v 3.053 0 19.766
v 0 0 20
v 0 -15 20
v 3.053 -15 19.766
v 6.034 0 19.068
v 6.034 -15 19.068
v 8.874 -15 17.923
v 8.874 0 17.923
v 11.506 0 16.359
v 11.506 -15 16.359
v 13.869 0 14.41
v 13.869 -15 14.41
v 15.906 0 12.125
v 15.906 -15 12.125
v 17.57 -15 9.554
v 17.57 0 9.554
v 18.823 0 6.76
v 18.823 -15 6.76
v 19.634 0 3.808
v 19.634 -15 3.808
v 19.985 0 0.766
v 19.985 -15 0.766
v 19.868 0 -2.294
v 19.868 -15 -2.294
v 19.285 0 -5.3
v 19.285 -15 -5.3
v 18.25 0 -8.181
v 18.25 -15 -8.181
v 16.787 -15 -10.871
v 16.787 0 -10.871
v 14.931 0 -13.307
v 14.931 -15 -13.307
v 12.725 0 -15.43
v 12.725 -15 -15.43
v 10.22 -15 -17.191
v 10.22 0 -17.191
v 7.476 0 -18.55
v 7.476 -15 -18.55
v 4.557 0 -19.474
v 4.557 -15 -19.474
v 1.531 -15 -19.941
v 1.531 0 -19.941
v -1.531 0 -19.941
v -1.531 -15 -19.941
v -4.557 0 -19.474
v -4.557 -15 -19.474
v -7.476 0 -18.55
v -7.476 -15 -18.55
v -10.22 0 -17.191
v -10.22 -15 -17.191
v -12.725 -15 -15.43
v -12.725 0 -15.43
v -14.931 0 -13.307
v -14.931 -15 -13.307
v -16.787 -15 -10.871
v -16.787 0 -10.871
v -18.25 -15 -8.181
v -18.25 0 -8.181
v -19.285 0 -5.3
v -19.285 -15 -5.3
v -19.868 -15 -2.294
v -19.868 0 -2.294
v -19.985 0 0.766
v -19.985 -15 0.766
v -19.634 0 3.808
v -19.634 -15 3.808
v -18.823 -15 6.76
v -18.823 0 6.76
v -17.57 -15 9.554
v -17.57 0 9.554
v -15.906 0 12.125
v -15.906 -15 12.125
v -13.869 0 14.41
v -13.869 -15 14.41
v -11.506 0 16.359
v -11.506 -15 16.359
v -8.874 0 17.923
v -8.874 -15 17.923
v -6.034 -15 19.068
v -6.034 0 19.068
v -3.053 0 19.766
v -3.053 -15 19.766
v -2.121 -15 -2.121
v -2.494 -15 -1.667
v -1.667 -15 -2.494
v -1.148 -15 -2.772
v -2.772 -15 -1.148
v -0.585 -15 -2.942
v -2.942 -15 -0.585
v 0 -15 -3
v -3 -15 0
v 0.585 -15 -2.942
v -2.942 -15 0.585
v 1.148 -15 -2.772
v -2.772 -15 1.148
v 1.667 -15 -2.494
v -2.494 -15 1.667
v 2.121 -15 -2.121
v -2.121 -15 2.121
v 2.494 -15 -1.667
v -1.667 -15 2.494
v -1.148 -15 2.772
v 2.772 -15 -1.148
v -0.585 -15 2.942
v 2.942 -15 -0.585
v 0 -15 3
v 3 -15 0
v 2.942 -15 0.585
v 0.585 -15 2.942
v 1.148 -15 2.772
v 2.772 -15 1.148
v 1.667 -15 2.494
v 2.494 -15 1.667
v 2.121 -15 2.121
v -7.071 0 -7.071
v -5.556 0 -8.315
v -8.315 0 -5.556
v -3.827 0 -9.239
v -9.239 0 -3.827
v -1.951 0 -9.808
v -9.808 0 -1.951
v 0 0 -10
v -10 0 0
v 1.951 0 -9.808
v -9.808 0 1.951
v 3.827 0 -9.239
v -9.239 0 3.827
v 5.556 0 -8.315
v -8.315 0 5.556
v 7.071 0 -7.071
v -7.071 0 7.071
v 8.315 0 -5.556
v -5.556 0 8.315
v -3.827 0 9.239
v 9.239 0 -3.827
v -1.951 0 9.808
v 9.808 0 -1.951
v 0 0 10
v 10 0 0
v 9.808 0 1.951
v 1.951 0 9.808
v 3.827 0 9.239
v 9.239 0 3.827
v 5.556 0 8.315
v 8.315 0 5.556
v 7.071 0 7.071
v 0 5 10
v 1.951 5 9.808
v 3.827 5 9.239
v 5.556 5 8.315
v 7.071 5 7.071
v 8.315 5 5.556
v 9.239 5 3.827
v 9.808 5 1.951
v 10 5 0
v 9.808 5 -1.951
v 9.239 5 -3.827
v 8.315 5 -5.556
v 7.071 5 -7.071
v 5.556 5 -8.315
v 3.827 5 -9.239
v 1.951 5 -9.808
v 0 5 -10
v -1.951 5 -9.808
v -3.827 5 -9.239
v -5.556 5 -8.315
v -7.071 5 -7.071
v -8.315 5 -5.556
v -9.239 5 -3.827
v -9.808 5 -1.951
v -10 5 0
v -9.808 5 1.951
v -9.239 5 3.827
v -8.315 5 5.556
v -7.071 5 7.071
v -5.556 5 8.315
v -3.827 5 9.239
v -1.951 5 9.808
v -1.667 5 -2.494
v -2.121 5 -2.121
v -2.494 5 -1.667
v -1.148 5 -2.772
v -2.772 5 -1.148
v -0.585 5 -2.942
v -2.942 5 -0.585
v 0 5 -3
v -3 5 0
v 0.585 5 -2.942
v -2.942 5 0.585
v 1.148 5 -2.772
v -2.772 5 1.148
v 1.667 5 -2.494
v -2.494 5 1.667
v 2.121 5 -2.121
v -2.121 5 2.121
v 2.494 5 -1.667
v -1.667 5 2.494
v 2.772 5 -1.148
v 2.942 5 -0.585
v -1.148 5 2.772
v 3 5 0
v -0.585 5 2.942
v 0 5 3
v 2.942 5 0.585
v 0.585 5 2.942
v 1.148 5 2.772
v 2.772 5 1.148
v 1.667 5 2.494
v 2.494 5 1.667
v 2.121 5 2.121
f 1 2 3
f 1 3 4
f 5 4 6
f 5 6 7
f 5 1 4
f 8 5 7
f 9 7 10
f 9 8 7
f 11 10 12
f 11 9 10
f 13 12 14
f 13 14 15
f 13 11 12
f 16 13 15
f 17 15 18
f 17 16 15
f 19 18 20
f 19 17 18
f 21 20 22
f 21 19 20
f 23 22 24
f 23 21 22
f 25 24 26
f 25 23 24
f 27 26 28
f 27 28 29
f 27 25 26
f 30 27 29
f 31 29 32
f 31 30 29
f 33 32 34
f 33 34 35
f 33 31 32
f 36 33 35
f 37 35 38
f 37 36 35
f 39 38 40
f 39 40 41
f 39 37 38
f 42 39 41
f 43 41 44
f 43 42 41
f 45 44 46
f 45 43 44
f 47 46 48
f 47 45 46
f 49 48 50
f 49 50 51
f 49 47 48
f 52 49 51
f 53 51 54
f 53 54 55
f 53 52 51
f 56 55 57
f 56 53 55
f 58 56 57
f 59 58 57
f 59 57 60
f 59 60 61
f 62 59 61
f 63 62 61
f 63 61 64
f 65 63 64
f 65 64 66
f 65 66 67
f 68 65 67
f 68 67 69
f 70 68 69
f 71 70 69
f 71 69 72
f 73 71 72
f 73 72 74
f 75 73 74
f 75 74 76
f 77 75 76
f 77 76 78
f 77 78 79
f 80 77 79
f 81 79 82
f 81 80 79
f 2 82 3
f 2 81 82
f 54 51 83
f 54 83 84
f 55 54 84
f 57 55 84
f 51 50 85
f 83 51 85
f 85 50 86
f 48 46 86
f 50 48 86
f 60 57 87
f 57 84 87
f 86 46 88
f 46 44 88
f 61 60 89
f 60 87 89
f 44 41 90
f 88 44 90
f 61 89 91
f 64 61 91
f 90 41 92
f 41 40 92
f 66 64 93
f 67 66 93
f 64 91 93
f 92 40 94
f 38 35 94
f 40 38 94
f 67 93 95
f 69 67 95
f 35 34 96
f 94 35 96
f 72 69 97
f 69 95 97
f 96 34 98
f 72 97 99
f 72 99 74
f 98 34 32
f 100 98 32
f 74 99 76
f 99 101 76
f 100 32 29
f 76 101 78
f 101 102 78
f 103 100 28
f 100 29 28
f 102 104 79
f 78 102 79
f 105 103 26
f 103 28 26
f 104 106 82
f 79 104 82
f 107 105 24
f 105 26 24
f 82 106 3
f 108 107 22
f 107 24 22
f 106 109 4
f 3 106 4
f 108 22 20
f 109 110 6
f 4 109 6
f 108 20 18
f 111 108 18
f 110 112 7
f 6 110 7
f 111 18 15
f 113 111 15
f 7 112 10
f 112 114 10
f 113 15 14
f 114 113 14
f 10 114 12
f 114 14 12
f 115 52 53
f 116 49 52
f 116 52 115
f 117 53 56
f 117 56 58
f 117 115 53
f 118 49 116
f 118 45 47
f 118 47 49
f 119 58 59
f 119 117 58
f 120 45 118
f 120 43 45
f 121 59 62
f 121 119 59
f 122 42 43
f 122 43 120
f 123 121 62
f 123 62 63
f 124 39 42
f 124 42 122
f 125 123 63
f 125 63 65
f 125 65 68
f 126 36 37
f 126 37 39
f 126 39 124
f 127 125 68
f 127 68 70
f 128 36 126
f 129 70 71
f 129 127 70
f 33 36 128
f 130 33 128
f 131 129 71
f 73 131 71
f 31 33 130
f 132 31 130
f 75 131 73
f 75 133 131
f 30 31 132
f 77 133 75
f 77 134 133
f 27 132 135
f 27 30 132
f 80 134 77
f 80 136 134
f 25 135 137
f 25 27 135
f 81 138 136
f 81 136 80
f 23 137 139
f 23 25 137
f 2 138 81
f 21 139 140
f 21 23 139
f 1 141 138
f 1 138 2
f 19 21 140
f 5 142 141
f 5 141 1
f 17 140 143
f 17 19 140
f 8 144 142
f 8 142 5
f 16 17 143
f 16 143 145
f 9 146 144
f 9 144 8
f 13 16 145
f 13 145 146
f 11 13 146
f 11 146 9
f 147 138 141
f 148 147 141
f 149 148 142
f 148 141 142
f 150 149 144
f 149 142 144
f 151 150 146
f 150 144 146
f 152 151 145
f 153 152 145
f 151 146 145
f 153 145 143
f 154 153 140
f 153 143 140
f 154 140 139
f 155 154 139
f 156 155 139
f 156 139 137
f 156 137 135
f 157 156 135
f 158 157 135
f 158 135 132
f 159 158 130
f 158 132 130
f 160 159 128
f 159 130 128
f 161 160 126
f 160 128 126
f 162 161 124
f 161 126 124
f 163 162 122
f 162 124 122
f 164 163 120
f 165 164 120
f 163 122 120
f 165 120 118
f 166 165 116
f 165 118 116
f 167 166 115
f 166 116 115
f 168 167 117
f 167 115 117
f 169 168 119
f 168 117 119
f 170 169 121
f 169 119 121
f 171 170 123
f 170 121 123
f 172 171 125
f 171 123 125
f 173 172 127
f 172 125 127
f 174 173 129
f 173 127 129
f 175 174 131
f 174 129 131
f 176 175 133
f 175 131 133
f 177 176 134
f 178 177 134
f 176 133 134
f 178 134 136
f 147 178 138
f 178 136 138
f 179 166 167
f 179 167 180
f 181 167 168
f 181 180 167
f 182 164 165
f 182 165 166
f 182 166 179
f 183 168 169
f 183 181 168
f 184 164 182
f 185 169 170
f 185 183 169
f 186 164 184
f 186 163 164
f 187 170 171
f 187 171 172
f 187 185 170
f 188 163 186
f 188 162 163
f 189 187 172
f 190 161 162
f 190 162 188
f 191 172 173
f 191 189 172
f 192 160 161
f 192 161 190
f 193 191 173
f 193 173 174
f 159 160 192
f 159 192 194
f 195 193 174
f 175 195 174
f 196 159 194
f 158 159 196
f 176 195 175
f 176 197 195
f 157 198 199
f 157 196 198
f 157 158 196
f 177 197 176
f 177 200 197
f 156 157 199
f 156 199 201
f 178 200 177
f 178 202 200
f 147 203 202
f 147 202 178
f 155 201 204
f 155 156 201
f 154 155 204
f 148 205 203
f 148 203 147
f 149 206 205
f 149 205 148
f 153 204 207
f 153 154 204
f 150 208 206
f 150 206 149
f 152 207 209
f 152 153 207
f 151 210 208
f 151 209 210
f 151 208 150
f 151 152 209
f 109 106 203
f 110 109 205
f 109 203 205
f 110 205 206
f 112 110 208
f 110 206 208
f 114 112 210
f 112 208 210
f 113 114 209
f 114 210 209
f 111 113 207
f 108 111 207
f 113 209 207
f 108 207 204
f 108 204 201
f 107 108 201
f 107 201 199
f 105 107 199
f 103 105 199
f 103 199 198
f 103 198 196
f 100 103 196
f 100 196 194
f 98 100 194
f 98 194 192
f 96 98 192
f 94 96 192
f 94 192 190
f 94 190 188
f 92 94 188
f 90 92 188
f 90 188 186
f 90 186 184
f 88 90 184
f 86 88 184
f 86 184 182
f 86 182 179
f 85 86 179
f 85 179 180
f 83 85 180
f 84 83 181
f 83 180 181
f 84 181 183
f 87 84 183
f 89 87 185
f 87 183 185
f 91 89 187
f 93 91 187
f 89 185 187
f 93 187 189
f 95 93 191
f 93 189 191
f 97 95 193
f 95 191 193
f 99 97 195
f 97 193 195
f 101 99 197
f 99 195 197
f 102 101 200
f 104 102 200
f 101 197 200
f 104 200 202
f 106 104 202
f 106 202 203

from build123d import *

# Parameters (mm, degrees)
SKETCH1_R          = 20
EXTRUDE1_DEPTH     = 15
SKETCH2_R          = 10
EXTRUDE2_DEPTH     = 5
SKETCH3_R          = 3
CUT_EXTRUDE1_DEPTH = 35.641016151


with BuildPart() as part:
    # Sketch1 → Extrude1 (new body)
    with BuildSketch(Plane(origin=(0, 0, 0), x_dir=(1, 0, 0), z_dir=(0, 1, 0))):
        with Locations(Location((0, 0, 0), (0, 0, 270))):
            Circle(SKETCH1_R)
    extrude(amount=-EXTRUDE1_DEPTH)

    # Sketch2 → Extrude2 (add)
    with BuildSketch(Plane(origin=(0, 0, 0), x_dir=(1, 0, 0), z_dir=(0, 1, 0))):
        with Locations(Location((0, 0, 0), (0, 0, 270))):
            Circle(SKETCH2_R)
    extrude(amount=EXTRUDE2_DEPTH)

    # Sketch3 → Cut-Extrude1 (cut, through all)
    with BuildSketch(Plane(origin=(0, 5, 0), x_dir=(1, 0, 0), z_dir=(0, 1, 0))):
        with Locations(Location((0, 0, 0), (0, 0, 270))):
            Circle(SKETCH3_R)
    extrude(amount=-CUT_EXTRUDE1_DEPTH, mode=Mode.SUBTRACT)


solid = part.part
